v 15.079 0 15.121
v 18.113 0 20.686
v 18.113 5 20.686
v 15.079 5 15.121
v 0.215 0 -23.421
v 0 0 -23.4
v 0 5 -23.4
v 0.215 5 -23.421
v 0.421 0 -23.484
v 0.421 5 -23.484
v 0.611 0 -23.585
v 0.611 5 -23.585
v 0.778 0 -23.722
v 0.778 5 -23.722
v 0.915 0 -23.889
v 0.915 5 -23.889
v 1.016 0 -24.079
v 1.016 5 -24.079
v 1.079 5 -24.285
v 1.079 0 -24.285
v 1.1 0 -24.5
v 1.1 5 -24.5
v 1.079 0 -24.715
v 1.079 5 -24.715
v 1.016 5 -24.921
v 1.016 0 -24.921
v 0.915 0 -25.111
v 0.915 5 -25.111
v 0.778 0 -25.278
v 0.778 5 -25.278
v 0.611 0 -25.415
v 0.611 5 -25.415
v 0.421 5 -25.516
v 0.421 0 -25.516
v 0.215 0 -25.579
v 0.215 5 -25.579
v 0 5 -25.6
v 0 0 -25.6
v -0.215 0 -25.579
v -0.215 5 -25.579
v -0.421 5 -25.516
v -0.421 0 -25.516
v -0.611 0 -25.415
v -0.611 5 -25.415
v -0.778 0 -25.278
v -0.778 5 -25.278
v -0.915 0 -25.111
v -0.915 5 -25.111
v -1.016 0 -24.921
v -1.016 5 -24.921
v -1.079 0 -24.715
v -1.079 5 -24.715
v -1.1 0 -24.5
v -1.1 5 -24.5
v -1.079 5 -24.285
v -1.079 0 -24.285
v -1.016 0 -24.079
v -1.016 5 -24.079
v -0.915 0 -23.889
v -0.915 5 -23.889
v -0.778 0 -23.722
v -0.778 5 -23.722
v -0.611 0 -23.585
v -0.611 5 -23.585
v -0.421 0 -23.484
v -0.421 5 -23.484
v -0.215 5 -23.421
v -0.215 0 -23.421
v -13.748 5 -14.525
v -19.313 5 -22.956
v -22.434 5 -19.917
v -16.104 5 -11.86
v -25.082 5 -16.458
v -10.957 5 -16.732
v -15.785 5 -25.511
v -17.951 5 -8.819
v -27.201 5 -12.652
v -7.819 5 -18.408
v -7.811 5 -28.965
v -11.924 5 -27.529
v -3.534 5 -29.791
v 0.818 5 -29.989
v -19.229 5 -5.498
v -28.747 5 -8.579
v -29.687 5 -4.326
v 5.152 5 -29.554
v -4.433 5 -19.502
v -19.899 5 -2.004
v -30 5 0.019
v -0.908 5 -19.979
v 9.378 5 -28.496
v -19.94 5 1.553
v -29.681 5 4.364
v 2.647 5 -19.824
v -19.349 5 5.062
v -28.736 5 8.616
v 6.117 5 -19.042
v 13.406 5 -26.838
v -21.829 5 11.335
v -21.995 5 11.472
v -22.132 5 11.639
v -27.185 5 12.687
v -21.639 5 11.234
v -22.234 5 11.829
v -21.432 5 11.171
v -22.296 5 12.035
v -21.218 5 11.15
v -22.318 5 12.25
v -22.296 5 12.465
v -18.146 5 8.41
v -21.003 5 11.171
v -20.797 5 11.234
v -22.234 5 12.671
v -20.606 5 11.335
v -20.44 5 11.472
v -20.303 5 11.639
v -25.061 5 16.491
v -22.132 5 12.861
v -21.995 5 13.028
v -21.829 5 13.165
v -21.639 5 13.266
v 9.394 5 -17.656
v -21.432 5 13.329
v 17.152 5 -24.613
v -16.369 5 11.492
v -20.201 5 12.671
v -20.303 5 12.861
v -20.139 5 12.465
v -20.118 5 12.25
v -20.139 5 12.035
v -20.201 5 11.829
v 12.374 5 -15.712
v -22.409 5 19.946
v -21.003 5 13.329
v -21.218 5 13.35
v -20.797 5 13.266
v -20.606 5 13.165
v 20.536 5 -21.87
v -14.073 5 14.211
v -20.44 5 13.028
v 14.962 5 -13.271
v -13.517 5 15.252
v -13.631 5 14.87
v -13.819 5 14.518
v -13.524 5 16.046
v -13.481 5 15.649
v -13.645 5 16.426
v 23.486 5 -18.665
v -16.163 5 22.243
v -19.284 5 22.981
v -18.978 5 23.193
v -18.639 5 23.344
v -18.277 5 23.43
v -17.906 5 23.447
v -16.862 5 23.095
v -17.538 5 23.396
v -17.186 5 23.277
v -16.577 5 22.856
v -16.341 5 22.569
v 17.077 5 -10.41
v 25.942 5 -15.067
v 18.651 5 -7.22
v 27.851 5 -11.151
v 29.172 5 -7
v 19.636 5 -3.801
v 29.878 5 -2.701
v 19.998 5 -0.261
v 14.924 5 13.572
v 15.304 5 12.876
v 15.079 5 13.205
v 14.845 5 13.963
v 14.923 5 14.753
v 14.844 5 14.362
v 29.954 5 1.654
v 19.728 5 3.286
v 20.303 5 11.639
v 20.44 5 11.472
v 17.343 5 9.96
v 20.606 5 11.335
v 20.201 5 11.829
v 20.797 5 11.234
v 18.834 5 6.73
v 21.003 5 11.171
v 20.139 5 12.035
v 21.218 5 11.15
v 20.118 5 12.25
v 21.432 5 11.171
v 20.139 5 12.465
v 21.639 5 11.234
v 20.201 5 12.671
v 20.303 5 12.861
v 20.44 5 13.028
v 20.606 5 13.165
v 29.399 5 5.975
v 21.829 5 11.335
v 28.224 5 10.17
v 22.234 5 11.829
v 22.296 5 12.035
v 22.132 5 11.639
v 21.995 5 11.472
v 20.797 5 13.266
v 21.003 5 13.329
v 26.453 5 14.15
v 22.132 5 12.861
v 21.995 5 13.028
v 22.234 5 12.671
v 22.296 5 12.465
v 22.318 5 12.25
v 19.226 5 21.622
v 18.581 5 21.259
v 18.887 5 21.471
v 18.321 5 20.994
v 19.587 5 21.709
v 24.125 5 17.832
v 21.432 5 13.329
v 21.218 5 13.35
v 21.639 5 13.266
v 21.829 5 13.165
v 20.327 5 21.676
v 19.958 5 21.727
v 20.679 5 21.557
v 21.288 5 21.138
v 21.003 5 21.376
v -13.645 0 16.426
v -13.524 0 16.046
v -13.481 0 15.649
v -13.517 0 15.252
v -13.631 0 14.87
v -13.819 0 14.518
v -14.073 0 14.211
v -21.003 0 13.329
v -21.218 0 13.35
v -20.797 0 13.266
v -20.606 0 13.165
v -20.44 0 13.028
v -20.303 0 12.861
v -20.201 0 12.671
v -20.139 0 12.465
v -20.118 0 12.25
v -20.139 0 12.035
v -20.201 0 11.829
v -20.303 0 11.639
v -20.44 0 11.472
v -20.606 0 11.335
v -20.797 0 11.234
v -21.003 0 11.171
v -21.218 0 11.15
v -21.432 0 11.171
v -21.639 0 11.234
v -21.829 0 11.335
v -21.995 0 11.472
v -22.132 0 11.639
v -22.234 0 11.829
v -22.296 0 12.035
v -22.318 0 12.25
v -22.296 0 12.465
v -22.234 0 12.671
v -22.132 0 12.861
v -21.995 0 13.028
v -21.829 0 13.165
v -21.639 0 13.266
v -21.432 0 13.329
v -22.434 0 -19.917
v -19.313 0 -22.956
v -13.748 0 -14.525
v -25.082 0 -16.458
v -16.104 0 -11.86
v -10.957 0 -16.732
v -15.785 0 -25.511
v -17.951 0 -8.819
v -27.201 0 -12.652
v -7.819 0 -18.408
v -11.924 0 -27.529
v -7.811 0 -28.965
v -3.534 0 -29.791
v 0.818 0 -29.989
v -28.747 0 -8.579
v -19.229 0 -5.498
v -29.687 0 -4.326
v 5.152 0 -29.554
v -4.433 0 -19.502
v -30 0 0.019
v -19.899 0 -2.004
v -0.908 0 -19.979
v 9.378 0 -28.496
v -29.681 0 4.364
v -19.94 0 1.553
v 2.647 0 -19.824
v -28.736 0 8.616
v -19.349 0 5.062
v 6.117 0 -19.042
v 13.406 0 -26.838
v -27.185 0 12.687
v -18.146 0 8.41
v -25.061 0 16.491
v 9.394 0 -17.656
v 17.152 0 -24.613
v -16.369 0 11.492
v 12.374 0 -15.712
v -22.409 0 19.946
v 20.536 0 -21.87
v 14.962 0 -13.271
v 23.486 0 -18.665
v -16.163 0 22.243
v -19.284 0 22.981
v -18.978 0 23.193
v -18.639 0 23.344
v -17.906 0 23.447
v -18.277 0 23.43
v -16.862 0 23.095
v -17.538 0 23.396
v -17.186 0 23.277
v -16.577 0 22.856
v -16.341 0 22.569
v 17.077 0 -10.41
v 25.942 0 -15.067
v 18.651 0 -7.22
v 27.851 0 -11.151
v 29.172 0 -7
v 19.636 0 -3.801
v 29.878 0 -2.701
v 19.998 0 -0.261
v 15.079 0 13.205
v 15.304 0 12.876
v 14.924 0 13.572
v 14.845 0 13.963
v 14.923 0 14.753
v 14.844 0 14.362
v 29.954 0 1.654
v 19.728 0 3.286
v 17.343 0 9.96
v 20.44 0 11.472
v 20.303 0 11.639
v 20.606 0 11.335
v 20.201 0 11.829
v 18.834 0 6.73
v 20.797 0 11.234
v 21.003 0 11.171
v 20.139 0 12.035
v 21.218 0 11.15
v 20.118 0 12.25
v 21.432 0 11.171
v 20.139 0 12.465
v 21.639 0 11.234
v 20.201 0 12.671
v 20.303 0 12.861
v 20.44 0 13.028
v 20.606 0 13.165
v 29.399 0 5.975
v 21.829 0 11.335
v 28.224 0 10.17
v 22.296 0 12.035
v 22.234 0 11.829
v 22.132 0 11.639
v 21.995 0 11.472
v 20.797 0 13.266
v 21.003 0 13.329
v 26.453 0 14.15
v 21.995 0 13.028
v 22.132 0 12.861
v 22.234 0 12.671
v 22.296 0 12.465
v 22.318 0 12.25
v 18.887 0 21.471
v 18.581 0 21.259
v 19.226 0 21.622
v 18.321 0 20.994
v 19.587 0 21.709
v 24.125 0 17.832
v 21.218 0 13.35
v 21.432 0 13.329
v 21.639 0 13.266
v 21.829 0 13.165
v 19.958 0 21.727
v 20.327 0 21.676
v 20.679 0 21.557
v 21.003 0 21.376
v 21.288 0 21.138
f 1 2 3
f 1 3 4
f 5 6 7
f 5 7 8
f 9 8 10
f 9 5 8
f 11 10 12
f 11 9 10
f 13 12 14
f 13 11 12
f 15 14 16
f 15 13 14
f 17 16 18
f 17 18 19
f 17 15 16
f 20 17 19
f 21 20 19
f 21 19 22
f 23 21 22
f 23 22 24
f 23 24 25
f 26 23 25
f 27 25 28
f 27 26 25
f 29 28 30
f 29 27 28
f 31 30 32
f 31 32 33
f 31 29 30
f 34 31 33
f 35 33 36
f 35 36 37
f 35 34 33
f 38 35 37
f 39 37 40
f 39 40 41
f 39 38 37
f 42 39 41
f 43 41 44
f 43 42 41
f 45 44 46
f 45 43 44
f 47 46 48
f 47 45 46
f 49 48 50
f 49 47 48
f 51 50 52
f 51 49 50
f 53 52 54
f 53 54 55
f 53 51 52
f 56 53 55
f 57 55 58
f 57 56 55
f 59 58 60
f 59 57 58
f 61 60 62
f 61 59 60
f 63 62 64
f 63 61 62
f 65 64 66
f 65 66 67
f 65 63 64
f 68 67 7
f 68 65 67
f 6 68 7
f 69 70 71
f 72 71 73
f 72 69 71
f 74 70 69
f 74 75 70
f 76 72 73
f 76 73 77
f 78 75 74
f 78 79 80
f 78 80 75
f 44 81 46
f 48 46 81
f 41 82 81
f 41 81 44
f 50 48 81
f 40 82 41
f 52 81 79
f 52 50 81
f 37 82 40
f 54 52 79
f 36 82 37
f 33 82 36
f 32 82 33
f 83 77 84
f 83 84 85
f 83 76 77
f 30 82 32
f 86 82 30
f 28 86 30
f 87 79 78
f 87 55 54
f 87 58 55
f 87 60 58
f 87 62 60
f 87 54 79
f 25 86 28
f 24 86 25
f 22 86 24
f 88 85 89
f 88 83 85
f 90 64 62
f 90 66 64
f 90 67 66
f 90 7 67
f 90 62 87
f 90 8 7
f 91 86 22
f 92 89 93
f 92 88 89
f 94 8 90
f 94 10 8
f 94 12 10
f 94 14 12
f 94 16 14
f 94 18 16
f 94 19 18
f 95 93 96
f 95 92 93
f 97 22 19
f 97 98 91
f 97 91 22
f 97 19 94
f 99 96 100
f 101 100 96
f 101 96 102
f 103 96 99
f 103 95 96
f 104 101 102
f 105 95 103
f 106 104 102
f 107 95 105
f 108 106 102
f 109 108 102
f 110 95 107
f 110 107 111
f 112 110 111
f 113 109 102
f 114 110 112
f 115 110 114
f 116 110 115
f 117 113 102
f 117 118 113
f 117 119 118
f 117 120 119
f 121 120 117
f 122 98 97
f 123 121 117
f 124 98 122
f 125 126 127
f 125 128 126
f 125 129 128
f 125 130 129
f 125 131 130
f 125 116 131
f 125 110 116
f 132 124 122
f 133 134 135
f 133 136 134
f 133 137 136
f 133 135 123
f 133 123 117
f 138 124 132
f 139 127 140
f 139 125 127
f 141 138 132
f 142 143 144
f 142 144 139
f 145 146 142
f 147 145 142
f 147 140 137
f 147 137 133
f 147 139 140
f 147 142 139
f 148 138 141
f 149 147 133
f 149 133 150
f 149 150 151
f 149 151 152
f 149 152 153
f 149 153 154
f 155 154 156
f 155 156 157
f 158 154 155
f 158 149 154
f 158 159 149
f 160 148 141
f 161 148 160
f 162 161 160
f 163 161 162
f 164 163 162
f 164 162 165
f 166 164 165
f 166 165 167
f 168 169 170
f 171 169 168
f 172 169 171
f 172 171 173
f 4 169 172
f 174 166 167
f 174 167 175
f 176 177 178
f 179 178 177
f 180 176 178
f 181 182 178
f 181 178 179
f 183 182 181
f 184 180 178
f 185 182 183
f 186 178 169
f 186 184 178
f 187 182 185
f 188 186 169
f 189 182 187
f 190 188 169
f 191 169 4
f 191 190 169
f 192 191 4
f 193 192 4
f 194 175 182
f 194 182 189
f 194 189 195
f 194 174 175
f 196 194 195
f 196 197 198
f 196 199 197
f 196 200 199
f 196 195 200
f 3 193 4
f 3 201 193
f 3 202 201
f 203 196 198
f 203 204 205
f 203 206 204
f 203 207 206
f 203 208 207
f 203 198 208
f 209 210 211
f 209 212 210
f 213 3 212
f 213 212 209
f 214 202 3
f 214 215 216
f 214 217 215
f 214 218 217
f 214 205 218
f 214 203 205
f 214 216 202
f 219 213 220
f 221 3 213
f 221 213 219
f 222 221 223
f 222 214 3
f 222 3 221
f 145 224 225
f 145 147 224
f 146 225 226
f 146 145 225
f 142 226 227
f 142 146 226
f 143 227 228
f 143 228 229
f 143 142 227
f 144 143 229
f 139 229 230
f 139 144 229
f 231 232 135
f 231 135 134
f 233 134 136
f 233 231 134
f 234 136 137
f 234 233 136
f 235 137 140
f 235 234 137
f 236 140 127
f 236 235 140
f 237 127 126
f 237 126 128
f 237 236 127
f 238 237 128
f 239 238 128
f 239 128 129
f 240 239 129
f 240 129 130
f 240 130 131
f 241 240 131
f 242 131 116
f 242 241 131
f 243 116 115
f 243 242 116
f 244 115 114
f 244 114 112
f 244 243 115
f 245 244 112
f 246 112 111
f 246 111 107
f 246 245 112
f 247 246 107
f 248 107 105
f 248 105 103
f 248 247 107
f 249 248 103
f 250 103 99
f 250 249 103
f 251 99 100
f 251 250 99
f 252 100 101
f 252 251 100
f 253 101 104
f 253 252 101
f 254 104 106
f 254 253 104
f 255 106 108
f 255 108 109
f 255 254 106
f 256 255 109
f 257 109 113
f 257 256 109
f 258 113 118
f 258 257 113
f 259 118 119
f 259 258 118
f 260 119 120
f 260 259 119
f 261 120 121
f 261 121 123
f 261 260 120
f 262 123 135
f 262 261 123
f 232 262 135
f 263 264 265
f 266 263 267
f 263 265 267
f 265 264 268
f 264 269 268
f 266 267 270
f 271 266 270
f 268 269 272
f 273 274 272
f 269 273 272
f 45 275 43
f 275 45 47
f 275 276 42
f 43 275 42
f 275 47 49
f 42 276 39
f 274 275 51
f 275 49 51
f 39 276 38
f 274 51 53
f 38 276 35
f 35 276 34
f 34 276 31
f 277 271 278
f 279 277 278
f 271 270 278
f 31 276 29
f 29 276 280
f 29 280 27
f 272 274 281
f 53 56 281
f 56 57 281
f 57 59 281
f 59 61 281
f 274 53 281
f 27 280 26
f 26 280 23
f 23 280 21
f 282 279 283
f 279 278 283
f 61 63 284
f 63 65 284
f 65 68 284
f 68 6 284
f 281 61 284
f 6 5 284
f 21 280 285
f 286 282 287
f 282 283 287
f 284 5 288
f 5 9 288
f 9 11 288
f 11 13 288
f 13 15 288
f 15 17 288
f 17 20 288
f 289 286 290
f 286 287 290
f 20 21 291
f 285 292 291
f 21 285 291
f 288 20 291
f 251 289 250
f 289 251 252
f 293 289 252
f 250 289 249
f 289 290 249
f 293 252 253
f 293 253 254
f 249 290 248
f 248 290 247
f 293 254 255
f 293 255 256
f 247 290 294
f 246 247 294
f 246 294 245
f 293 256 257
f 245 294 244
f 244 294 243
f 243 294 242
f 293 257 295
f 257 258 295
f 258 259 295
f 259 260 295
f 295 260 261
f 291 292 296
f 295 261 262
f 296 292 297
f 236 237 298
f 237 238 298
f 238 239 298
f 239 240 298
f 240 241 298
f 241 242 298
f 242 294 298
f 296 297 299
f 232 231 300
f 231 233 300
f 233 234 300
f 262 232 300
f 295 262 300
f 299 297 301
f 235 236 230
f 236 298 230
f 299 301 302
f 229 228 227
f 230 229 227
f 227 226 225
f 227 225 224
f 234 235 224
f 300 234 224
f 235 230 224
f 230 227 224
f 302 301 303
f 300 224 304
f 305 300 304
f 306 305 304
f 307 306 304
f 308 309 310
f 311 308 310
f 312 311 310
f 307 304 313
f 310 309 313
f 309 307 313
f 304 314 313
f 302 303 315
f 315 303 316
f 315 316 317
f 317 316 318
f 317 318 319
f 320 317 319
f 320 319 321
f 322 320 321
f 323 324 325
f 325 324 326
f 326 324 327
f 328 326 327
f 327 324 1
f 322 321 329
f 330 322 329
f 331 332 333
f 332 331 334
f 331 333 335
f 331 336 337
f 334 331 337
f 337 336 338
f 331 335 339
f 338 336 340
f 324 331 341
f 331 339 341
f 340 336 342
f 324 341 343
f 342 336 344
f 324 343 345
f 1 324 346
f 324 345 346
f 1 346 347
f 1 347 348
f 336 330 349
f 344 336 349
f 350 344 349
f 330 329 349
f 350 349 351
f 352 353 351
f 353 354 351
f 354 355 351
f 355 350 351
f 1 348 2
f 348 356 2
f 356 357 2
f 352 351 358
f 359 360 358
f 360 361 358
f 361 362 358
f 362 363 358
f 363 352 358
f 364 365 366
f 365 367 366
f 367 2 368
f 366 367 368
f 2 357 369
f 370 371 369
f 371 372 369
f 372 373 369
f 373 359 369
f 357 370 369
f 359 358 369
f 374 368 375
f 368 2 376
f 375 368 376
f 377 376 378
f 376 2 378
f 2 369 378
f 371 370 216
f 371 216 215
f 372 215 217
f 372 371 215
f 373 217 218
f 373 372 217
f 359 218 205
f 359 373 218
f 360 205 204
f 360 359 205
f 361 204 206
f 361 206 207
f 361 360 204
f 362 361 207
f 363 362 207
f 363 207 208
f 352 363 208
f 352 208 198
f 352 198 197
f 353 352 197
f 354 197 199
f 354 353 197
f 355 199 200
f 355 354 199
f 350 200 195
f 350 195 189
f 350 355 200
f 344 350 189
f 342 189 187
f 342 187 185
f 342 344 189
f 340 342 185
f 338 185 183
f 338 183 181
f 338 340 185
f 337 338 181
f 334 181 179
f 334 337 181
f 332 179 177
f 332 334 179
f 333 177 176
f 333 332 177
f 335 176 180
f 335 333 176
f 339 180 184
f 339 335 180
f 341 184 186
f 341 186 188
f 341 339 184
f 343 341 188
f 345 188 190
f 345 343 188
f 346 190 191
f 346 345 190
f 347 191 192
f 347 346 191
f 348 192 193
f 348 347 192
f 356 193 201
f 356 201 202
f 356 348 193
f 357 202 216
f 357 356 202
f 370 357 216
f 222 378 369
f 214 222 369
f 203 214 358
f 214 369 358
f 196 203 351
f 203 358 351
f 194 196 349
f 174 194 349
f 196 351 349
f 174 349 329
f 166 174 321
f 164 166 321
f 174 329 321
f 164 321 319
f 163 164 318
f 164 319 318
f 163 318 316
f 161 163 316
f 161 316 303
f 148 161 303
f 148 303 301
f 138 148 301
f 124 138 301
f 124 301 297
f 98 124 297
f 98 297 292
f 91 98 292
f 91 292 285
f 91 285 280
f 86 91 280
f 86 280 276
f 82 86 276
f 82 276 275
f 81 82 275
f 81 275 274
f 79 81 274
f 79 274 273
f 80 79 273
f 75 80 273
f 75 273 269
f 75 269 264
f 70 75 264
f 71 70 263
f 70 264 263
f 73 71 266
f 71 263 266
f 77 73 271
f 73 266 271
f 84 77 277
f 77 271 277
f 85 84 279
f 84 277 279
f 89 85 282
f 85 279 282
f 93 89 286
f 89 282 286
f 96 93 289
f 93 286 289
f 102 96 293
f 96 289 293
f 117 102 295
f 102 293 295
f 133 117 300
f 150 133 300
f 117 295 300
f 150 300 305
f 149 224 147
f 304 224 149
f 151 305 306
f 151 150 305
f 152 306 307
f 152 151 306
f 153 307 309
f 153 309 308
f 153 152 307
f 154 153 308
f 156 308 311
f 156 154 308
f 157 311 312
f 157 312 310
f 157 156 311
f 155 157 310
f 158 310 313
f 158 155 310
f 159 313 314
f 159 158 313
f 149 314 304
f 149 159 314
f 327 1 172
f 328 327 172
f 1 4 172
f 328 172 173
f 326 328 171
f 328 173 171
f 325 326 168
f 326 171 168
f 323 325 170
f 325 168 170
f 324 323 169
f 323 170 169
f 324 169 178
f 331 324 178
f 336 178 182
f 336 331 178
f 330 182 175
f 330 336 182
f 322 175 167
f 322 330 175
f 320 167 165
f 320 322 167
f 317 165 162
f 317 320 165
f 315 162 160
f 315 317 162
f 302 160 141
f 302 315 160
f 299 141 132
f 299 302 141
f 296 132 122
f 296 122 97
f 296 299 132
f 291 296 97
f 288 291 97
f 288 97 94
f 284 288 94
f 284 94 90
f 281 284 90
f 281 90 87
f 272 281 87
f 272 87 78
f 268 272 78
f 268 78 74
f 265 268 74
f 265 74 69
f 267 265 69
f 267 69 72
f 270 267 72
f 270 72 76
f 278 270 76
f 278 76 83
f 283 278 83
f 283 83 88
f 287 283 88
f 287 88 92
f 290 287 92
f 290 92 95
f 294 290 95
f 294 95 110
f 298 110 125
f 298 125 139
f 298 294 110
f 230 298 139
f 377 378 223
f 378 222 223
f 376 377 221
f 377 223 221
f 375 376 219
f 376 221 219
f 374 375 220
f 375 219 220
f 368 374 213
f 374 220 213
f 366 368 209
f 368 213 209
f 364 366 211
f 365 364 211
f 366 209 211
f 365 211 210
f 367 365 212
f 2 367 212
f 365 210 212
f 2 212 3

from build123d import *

# Parameters (mm, degrees)
SKETCH_1_R          = 30
SKETCH_1_R_2        = 20
SKETCH_1_R_3        = 1.1
EXTRUDE_1_DEPTH     = 5
CUT_EXTRUDE_START   = -10
CUT_EXTRUDE_1_DEPTH = 10
FILLET_1_R          = 2


with BuildPart() as part:
    # 草图1 → 凸台-拉伸1 (new body)
    with BuildSketch(Plane(origin=(0, 0, 0), x_dir=(1, 0, 0), z_dir=(0, 1, 0))):
        with Locations(Location((0, 0, 0), (0, 0, 270))):
            Circle(SKETCH_1_R)
        with Locations(Location((0, 0, 0), (0, 0, 270))):
            Circle(SKETCH_1_R_2, mode=Mode.SUBTRACT)
        with Locations(Location((0, 24.5, 0), (0, 0, 270))):
            Circle(SKETCH_1_R_3, mode=Mode.SUBTRACT)
        with Locations(Location((21.217622393, -12.25, 0), (0, 0, 270))):
            Circle(SKETCH_1_R_3, mode=Mode.SUBTRACT)
        with Locations(Location((-21.217622393, -12.25, 0), (0, 0, 270))):
            Circle(SKETCH_1_R_3, mode=Mode.SUBTRACT)
    extrude(amount=EXTRUDE_1_DEPTH)

    # 草图2 → 切除-拉伸1 (cut)
    with BuildSketch(Plane(origin=(0, 5, 0), x_dir=(1, 0, 0), z_dir=(0, 1, 0)).offset(CUT_EXTRUDE_START)):
        with BuildLine():
            Line((19.339127693, -22.934649334), (14.401131779, -13.878306939))
            ThreePointArc((14.401131779, -13.878306939), (0.907800118, -19.979386851), (-13.08321747, -15.1271088))
            Line((-13.08321747, -15.1271088), (-17.179578816, -24.593943801))
            ThreePointArc((-17.179578816, -24.593943801), (1.361700176, -29.969080277), (19.339127693, -22.934649334))
        make_face()
    extrude(amount=CUT_EXTRUDE_1_DEPTH, mode=Mode.SUBTRACT)

    # 圆角1
    fillet_1_edges = [part.edges().sort_by_distance(p)[0] for p in [
        (14.401131779, 2.5, 13.878306939),
        (-13.08321747, 2.5, 15.1271088),
        (19.339127693, 2.5, 22.934649334),
        (-17.179578816, 2.5, 24.593943801),
    ]]
    fillet(fillet_1_edges, radius=FILLET_1_R)


solid = part.part
